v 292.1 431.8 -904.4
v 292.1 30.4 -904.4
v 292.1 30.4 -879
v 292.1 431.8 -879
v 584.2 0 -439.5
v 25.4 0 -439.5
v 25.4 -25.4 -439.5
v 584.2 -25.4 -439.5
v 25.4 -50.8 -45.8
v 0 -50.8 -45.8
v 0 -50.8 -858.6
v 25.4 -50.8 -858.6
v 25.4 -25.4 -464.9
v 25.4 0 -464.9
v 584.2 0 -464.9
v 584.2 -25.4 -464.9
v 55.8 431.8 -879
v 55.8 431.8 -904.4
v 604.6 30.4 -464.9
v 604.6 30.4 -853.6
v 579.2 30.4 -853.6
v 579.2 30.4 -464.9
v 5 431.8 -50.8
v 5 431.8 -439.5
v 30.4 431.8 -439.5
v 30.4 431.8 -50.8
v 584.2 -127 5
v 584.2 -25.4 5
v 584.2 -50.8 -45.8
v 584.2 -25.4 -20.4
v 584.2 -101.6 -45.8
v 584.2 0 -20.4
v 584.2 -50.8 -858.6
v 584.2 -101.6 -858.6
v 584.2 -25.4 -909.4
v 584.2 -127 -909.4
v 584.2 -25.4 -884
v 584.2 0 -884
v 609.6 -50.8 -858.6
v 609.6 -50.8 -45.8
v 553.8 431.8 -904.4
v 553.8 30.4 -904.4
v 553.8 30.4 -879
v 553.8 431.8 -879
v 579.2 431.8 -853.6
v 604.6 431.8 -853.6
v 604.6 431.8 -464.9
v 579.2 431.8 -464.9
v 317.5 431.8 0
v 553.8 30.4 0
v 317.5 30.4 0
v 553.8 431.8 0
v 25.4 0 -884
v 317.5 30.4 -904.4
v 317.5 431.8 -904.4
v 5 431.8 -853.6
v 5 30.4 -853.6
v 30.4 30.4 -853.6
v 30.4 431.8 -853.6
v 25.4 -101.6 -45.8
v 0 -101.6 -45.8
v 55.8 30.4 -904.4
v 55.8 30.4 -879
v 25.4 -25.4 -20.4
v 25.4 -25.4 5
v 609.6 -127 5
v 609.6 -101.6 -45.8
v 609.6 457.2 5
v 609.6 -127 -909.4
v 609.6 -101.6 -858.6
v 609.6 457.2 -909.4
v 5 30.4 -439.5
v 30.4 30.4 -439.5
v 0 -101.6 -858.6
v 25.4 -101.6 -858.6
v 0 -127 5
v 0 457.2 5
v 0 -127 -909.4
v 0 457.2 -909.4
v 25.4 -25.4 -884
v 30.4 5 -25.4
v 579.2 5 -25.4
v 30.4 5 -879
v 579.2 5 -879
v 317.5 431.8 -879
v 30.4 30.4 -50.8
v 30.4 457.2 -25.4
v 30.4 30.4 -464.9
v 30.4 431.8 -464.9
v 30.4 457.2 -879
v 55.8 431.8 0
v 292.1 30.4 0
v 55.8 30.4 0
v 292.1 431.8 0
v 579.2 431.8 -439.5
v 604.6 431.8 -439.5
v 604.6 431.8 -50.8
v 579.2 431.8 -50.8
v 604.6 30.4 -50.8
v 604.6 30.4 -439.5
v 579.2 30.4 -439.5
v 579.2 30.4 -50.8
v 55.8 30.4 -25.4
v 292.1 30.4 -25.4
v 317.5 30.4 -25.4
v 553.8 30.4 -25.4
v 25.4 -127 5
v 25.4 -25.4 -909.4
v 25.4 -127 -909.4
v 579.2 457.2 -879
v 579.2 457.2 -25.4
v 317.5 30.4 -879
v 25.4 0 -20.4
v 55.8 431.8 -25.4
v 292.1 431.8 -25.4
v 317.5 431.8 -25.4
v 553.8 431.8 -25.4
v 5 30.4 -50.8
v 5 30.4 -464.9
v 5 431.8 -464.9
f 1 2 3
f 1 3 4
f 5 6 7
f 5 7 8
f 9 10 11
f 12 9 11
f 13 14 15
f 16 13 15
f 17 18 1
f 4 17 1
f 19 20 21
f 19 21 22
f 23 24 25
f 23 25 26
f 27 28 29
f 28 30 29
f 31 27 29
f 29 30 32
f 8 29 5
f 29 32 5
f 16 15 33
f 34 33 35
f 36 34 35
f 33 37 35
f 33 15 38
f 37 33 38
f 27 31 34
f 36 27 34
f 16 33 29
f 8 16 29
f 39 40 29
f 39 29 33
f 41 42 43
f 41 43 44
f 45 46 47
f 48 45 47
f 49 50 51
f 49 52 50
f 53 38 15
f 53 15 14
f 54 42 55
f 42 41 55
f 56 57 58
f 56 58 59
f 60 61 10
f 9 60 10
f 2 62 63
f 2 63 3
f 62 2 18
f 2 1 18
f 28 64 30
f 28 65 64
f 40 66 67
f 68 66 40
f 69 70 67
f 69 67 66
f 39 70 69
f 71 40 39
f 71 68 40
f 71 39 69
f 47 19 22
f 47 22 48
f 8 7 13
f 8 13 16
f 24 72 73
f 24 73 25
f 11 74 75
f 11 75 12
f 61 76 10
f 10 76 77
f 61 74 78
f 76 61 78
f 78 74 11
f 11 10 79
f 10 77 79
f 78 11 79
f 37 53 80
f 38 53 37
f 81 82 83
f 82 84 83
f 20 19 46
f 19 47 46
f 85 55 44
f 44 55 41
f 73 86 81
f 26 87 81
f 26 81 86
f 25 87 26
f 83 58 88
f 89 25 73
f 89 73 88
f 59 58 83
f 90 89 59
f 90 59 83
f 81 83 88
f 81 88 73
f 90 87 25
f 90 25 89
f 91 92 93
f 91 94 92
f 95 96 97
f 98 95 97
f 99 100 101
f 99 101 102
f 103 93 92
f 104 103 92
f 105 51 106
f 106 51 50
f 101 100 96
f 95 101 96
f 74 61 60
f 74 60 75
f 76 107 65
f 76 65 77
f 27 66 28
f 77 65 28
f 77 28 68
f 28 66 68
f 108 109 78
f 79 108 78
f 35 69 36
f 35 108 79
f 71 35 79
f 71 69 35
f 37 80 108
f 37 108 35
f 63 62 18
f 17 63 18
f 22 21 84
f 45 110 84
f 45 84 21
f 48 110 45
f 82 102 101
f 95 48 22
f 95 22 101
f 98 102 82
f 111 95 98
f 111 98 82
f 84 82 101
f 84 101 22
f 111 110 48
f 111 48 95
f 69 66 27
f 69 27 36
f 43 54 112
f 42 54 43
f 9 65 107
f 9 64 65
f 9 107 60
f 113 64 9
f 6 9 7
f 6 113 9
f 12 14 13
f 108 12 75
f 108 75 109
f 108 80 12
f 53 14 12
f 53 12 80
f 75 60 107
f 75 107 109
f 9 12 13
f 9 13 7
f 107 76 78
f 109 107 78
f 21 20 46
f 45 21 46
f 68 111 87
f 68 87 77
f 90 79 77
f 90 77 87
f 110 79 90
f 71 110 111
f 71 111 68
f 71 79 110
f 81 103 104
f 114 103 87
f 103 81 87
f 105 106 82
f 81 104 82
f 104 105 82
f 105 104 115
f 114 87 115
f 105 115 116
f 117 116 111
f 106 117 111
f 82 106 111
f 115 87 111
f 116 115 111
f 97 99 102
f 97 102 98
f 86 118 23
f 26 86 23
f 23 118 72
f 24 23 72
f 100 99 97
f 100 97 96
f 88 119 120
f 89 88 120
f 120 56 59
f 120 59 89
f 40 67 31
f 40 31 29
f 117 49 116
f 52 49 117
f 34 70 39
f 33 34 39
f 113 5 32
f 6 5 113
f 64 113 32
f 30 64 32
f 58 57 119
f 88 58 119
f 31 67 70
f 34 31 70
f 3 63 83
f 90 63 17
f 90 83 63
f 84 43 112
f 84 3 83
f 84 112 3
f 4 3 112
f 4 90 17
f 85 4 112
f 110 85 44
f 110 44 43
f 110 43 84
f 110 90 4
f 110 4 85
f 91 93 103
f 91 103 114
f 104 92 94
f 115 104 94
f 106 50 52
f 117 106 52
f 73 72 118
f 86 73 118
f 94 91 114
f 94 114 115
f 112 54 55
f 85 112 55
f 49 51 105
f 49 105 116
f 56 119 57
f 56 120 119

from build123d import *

# Parameters (mm, degrees)
SKETCH1_W            = 609.6
SKETCH1_H            = 457.2
BOSS_EXTRUDE1_DEPTH  = 5
SKETCH2_W            = 5
SKETCH2_H            = 914.4
BOSS_EXTRUDE2_DEPTH  = 457.2
SKETCH3_W            = 609.6
SKETCH3_H            = 457.2
BOSS_EXTRUDE3_DEPTH  = 5
SKETCH4_W            = 914.4
SKETCH4_H            = 457.2
BOSS_EXTRUDE4_DEPTH  = 5
SKETCH5_W            = 609.6
SKETCH5_H            = 914.4
BOSS_EXTRUDE5_DEPTH  = 5
SKETCH6_W            = 609.6
SKETCH6_H            = 914.4
SKETCH6_W_2          = 558.8
SKETCH6_H_2          = 863.6
BOSS_EXTRUDE6_DEPTH  = 25.4
SKETCH7_W            = 25.4
SKETCH7_H            = 863.6
BOSS_EXTRUDE7_DEPTH  = 25.4
SKETCH10_W           = 904.4
SKETCH10_H           = 452.2
SKETCH10_W_2         = 853.6
SKETCH10_H_2         = 401.4
BOSS_EXTRUDE8_DEPTH  = 25.4
SKETCH22_W           = 548.8
SKETCH22_H           = 452.2
SKETCH22_W_2         = 236.3
SKETCH22_H_2         = 401.4
BOSS_EXTRUDE14_DEPTH = 25.4
SKETCH15_W           = 25.4
SKETCH15_H           = 401.4
BOSS_EXTRUDE15_DEPTH = 25.4
SKETCH23_W           = 25.4
SKETCH23_H           = 401.4
BOSS_EXTRUDE16_DEPTH = 25.4
SKETCH17_W           = 914.4
SKETCH17_H           = 101.6
SKETCH17_W_2         = 812.8
SKETCH17_H_2         = 50.8
BOSS_EXTRUDE17_DEPTH = 25.4
SKETCH25_W           = 25.4
SKETCH25_H           = 863.6
CUT_EXTRUDE1_DEPTH   = 25.4
SKETCH26_W           = 558.8
SKETCH26_H           = 25.4
BOSS_EXTRUDE18_DEPTH = 25.4


with BuildPart() as part:
    # Sketch1 → Boss-Extrude1 (new body)
    with BuildSketch(Plane.XY):
        with Locations((304.8, 228.6)):
            Rectangle(SKETCH1_W, SKETCH1_H)
    extrude(amount=BOSS_EXTRUDE1_DEPTH)

    # Sketch2 → Boss-Extrude2 (add)
    with BuildSketch(Plane(origin=(0, 0, 0), x_dir=(1, 0, 0), z_dir=(0, 1, 0))):
        with Locations((2.5, 452.2)):
            Rectangle(SKETCH2_W, SKETCH2_H)
    extrude(amount=BOSS_EXTRUDE2_DEPTH)

    # Sketch3 → Boss-Extrude3 (add)
    with BuildSketch(Plane(origin=(0, 0, -909.4), x_dir=(-1, 0, 0), z_dir=(0, 0, -1))):
        with Locations((-304.8, 228.6)):
            Rectangle(SKETCH3_W, SKETCH3_H)
    extrude(amount=-BOSS_EXTRUDE3_DEPTH)

    # Sketch4 → Boss-Extrude4 (add)
    with BuildSketch(Plane(origin=(609.6, 0, 0), x_dir=(0, 0, -1), z_dir=(1, 0, 0))):
        with Locations((452.2, 228.6)):
            Rectangle(SKETCH4_W, SKETCH4_H)
    extrude(amount=-BOSS_EXTRUDE4_DEPTH)

    # Sketch5 → Boss-Extrude5 (add)
    with BuildSketch(Plane(origin=(0, 0, 0), x_dir=(-1, 0, 0), z_dir=(0, -1, 0))):
        with Locations((-304.8, 452.2)):
            Rectangle(SKETCH5_W, SKETCH5_H)
    extrude(amount=-BOSS_EXTRUDE5_DEPTH)

    # Sketch6 → Boss-Extrude6 (add)
    with BuildSketch(Plane.XZ):
        with Locations((304.8, -452.2)):
            Rectangle(SKETCH6_W, SKETCH6_H)
        with Locations((304.8, -452.2)):
            Rectangle(SKETCH6_W_2, SKETCH6_H_2, mode=Mode.SUBTRACT)
    extrude(amount=BOSS_EXTRUDE6_DEPTH)

    # Sketch7 → Boss-Extrude7 (add)
    with BuildSketch(Plane.XZ):
        with Locations((304.8, -452.2)):
            Rectangle(SKETCH7_W, SKETCH7_H)
    extrude(amount=BOSS_EXTRUDE7_DEPTH)

    # Sketch10 → Boss-Extrude8 (add)
    with BuildSketch(Plane.ZY.offset(-604.6)):
        with Locations((-452.2, 231.1)):
            Rectangle(SKETCH10_W, SKETCH10_H)
        with Locations((-452.2, 231.1)):
            Rectangle(SKETCH10_W_2, SKETCH10_H_2, mode=Mode.SUBTRACT)
    extrude(amount=BOSS_EXTRUDE8_DEPTH)


with BuildPart() as body_2:
    # Mirror3: mirrored copy
    add(part.part.mirror(Plane(origin=(304.8, 457.2, -904.4), x_dir=(0, 0, 1), z_dir=(1, 0, 0))))


with BuildPart() as part_1:
    add(part.part)

    add(body_2.part)  # Boss-Extrude14 merges body 2
    # Sketch22 → Boss-Extrude14 (add)
    with BuildSketch(Plane.XY.offset(-904.4)):
        with Locations((304.8, 231.1)):
            Rectangle(SKETCH22_W, SKETCH22_H)
        with Locations((173.95, 231.1)):
            Rectangle(SKETCH22_W_2, SKETCH22_H_2, mode=Mode.SUBTRACT)
        with Locations((435.65, 231.1)):
            Rectangle(SKETCH22_W_2, SKETCH22_H_2, mode=Mode.SUBTRACT)
    extrude(amount=BOSS_EXTRUDE14_DEPTH)

    # Sketch15 → Boss-Extrude15 (add)
    with BuildSketch(Plane(origin=(5, 0, 0), x_dir=(0, 0, -1), z_dir=(1, 0, 0))):
        with Locations((38.1, 231.1)):
            Rectangle(SKETCH15_W, SKETCH15_H)
        with Locations((866.3, 231.1)):
            Rectangle(SKETCH15_W, SKETCH15_H)
        with Locations((452.2, 231.1)):
            Rectangle(SKETCH15_W, SKETCH15_H)
    extrude(amount=BOSS_EXTRUDE15_DEPTH)

    # Sketch23 → Boss-Extrude16 (add)
    with BuildSketch(Plane.ZY.offset(-604.6)):
        with Locations((-38.1, 231.1)):
            Rectangle(SKETCH23_W, SKETCH23_H)
        with Locations((-452.2, 231.1)):
            Rectangle(SKETCH23_W, SKETCH23_H)
        with Locations((-866.3, 231.1)):
            Rectangle(SKETCH23_W, SKETCH23_H)
    extrude(amount=BOSS_EXTRUDE16_DEPTH)

    # Mirror9: part across plane


with BuildPart() as part_2:
    add(part_1.part)
    add(part_1.part.mirror(Plane.XY.offset(-452.2)))

    # Sketch17 → Boss-Extrude17 (add)
    with BuildSketch(Plane(origin=(0, 0, 5), x_dir=(0, 0, -1), z_dir=(1, 0, 0))):
        with Locations((457.2, -76.2)):
            Rectangle(SKETCH17_W, SKETCH17_H)
        with Locations((457.2, -76.2)):
            Rectangle(SKETCH17_W_2, SKETCH17_H_2, mode=Mode.SUBTRACT)
    extrude(amount=BOSS_EXTRUDE17_DEPTH)

    # Mirror10: part across plane


with BuildPart() as part_3:
    add(part_2.part)
    add(part_2.part.mirror(Plane(origin=(304.8, 457.2, -904.4), x_dir=(0, 0, 1), z_dir=(1, 0, 0))))

    # Sketch25 → Cut-Extrude1 (cut)
    with BuildSketch(Plane.XZ.offset(25.4)):
        with Locations((304.8, -452.2)):
            Rectangle(SKETCH25_W, SKETCH25_H)
    extrude(amount=-CUT_EXTRUDE1_DEPTH, mode=Mode.SUBTRACT)

    # Sketch26 → Boss-Extrude18 (add)
    with BuildSketch(Plane.XZ):
        with Locations((304.8, -452.2)):
            Rectangle(SKETCH26_W, SKETCH26_H)
    extrude(amount=BOSS_EXTRUDE18_DEPTH)


solid = part_3.part
